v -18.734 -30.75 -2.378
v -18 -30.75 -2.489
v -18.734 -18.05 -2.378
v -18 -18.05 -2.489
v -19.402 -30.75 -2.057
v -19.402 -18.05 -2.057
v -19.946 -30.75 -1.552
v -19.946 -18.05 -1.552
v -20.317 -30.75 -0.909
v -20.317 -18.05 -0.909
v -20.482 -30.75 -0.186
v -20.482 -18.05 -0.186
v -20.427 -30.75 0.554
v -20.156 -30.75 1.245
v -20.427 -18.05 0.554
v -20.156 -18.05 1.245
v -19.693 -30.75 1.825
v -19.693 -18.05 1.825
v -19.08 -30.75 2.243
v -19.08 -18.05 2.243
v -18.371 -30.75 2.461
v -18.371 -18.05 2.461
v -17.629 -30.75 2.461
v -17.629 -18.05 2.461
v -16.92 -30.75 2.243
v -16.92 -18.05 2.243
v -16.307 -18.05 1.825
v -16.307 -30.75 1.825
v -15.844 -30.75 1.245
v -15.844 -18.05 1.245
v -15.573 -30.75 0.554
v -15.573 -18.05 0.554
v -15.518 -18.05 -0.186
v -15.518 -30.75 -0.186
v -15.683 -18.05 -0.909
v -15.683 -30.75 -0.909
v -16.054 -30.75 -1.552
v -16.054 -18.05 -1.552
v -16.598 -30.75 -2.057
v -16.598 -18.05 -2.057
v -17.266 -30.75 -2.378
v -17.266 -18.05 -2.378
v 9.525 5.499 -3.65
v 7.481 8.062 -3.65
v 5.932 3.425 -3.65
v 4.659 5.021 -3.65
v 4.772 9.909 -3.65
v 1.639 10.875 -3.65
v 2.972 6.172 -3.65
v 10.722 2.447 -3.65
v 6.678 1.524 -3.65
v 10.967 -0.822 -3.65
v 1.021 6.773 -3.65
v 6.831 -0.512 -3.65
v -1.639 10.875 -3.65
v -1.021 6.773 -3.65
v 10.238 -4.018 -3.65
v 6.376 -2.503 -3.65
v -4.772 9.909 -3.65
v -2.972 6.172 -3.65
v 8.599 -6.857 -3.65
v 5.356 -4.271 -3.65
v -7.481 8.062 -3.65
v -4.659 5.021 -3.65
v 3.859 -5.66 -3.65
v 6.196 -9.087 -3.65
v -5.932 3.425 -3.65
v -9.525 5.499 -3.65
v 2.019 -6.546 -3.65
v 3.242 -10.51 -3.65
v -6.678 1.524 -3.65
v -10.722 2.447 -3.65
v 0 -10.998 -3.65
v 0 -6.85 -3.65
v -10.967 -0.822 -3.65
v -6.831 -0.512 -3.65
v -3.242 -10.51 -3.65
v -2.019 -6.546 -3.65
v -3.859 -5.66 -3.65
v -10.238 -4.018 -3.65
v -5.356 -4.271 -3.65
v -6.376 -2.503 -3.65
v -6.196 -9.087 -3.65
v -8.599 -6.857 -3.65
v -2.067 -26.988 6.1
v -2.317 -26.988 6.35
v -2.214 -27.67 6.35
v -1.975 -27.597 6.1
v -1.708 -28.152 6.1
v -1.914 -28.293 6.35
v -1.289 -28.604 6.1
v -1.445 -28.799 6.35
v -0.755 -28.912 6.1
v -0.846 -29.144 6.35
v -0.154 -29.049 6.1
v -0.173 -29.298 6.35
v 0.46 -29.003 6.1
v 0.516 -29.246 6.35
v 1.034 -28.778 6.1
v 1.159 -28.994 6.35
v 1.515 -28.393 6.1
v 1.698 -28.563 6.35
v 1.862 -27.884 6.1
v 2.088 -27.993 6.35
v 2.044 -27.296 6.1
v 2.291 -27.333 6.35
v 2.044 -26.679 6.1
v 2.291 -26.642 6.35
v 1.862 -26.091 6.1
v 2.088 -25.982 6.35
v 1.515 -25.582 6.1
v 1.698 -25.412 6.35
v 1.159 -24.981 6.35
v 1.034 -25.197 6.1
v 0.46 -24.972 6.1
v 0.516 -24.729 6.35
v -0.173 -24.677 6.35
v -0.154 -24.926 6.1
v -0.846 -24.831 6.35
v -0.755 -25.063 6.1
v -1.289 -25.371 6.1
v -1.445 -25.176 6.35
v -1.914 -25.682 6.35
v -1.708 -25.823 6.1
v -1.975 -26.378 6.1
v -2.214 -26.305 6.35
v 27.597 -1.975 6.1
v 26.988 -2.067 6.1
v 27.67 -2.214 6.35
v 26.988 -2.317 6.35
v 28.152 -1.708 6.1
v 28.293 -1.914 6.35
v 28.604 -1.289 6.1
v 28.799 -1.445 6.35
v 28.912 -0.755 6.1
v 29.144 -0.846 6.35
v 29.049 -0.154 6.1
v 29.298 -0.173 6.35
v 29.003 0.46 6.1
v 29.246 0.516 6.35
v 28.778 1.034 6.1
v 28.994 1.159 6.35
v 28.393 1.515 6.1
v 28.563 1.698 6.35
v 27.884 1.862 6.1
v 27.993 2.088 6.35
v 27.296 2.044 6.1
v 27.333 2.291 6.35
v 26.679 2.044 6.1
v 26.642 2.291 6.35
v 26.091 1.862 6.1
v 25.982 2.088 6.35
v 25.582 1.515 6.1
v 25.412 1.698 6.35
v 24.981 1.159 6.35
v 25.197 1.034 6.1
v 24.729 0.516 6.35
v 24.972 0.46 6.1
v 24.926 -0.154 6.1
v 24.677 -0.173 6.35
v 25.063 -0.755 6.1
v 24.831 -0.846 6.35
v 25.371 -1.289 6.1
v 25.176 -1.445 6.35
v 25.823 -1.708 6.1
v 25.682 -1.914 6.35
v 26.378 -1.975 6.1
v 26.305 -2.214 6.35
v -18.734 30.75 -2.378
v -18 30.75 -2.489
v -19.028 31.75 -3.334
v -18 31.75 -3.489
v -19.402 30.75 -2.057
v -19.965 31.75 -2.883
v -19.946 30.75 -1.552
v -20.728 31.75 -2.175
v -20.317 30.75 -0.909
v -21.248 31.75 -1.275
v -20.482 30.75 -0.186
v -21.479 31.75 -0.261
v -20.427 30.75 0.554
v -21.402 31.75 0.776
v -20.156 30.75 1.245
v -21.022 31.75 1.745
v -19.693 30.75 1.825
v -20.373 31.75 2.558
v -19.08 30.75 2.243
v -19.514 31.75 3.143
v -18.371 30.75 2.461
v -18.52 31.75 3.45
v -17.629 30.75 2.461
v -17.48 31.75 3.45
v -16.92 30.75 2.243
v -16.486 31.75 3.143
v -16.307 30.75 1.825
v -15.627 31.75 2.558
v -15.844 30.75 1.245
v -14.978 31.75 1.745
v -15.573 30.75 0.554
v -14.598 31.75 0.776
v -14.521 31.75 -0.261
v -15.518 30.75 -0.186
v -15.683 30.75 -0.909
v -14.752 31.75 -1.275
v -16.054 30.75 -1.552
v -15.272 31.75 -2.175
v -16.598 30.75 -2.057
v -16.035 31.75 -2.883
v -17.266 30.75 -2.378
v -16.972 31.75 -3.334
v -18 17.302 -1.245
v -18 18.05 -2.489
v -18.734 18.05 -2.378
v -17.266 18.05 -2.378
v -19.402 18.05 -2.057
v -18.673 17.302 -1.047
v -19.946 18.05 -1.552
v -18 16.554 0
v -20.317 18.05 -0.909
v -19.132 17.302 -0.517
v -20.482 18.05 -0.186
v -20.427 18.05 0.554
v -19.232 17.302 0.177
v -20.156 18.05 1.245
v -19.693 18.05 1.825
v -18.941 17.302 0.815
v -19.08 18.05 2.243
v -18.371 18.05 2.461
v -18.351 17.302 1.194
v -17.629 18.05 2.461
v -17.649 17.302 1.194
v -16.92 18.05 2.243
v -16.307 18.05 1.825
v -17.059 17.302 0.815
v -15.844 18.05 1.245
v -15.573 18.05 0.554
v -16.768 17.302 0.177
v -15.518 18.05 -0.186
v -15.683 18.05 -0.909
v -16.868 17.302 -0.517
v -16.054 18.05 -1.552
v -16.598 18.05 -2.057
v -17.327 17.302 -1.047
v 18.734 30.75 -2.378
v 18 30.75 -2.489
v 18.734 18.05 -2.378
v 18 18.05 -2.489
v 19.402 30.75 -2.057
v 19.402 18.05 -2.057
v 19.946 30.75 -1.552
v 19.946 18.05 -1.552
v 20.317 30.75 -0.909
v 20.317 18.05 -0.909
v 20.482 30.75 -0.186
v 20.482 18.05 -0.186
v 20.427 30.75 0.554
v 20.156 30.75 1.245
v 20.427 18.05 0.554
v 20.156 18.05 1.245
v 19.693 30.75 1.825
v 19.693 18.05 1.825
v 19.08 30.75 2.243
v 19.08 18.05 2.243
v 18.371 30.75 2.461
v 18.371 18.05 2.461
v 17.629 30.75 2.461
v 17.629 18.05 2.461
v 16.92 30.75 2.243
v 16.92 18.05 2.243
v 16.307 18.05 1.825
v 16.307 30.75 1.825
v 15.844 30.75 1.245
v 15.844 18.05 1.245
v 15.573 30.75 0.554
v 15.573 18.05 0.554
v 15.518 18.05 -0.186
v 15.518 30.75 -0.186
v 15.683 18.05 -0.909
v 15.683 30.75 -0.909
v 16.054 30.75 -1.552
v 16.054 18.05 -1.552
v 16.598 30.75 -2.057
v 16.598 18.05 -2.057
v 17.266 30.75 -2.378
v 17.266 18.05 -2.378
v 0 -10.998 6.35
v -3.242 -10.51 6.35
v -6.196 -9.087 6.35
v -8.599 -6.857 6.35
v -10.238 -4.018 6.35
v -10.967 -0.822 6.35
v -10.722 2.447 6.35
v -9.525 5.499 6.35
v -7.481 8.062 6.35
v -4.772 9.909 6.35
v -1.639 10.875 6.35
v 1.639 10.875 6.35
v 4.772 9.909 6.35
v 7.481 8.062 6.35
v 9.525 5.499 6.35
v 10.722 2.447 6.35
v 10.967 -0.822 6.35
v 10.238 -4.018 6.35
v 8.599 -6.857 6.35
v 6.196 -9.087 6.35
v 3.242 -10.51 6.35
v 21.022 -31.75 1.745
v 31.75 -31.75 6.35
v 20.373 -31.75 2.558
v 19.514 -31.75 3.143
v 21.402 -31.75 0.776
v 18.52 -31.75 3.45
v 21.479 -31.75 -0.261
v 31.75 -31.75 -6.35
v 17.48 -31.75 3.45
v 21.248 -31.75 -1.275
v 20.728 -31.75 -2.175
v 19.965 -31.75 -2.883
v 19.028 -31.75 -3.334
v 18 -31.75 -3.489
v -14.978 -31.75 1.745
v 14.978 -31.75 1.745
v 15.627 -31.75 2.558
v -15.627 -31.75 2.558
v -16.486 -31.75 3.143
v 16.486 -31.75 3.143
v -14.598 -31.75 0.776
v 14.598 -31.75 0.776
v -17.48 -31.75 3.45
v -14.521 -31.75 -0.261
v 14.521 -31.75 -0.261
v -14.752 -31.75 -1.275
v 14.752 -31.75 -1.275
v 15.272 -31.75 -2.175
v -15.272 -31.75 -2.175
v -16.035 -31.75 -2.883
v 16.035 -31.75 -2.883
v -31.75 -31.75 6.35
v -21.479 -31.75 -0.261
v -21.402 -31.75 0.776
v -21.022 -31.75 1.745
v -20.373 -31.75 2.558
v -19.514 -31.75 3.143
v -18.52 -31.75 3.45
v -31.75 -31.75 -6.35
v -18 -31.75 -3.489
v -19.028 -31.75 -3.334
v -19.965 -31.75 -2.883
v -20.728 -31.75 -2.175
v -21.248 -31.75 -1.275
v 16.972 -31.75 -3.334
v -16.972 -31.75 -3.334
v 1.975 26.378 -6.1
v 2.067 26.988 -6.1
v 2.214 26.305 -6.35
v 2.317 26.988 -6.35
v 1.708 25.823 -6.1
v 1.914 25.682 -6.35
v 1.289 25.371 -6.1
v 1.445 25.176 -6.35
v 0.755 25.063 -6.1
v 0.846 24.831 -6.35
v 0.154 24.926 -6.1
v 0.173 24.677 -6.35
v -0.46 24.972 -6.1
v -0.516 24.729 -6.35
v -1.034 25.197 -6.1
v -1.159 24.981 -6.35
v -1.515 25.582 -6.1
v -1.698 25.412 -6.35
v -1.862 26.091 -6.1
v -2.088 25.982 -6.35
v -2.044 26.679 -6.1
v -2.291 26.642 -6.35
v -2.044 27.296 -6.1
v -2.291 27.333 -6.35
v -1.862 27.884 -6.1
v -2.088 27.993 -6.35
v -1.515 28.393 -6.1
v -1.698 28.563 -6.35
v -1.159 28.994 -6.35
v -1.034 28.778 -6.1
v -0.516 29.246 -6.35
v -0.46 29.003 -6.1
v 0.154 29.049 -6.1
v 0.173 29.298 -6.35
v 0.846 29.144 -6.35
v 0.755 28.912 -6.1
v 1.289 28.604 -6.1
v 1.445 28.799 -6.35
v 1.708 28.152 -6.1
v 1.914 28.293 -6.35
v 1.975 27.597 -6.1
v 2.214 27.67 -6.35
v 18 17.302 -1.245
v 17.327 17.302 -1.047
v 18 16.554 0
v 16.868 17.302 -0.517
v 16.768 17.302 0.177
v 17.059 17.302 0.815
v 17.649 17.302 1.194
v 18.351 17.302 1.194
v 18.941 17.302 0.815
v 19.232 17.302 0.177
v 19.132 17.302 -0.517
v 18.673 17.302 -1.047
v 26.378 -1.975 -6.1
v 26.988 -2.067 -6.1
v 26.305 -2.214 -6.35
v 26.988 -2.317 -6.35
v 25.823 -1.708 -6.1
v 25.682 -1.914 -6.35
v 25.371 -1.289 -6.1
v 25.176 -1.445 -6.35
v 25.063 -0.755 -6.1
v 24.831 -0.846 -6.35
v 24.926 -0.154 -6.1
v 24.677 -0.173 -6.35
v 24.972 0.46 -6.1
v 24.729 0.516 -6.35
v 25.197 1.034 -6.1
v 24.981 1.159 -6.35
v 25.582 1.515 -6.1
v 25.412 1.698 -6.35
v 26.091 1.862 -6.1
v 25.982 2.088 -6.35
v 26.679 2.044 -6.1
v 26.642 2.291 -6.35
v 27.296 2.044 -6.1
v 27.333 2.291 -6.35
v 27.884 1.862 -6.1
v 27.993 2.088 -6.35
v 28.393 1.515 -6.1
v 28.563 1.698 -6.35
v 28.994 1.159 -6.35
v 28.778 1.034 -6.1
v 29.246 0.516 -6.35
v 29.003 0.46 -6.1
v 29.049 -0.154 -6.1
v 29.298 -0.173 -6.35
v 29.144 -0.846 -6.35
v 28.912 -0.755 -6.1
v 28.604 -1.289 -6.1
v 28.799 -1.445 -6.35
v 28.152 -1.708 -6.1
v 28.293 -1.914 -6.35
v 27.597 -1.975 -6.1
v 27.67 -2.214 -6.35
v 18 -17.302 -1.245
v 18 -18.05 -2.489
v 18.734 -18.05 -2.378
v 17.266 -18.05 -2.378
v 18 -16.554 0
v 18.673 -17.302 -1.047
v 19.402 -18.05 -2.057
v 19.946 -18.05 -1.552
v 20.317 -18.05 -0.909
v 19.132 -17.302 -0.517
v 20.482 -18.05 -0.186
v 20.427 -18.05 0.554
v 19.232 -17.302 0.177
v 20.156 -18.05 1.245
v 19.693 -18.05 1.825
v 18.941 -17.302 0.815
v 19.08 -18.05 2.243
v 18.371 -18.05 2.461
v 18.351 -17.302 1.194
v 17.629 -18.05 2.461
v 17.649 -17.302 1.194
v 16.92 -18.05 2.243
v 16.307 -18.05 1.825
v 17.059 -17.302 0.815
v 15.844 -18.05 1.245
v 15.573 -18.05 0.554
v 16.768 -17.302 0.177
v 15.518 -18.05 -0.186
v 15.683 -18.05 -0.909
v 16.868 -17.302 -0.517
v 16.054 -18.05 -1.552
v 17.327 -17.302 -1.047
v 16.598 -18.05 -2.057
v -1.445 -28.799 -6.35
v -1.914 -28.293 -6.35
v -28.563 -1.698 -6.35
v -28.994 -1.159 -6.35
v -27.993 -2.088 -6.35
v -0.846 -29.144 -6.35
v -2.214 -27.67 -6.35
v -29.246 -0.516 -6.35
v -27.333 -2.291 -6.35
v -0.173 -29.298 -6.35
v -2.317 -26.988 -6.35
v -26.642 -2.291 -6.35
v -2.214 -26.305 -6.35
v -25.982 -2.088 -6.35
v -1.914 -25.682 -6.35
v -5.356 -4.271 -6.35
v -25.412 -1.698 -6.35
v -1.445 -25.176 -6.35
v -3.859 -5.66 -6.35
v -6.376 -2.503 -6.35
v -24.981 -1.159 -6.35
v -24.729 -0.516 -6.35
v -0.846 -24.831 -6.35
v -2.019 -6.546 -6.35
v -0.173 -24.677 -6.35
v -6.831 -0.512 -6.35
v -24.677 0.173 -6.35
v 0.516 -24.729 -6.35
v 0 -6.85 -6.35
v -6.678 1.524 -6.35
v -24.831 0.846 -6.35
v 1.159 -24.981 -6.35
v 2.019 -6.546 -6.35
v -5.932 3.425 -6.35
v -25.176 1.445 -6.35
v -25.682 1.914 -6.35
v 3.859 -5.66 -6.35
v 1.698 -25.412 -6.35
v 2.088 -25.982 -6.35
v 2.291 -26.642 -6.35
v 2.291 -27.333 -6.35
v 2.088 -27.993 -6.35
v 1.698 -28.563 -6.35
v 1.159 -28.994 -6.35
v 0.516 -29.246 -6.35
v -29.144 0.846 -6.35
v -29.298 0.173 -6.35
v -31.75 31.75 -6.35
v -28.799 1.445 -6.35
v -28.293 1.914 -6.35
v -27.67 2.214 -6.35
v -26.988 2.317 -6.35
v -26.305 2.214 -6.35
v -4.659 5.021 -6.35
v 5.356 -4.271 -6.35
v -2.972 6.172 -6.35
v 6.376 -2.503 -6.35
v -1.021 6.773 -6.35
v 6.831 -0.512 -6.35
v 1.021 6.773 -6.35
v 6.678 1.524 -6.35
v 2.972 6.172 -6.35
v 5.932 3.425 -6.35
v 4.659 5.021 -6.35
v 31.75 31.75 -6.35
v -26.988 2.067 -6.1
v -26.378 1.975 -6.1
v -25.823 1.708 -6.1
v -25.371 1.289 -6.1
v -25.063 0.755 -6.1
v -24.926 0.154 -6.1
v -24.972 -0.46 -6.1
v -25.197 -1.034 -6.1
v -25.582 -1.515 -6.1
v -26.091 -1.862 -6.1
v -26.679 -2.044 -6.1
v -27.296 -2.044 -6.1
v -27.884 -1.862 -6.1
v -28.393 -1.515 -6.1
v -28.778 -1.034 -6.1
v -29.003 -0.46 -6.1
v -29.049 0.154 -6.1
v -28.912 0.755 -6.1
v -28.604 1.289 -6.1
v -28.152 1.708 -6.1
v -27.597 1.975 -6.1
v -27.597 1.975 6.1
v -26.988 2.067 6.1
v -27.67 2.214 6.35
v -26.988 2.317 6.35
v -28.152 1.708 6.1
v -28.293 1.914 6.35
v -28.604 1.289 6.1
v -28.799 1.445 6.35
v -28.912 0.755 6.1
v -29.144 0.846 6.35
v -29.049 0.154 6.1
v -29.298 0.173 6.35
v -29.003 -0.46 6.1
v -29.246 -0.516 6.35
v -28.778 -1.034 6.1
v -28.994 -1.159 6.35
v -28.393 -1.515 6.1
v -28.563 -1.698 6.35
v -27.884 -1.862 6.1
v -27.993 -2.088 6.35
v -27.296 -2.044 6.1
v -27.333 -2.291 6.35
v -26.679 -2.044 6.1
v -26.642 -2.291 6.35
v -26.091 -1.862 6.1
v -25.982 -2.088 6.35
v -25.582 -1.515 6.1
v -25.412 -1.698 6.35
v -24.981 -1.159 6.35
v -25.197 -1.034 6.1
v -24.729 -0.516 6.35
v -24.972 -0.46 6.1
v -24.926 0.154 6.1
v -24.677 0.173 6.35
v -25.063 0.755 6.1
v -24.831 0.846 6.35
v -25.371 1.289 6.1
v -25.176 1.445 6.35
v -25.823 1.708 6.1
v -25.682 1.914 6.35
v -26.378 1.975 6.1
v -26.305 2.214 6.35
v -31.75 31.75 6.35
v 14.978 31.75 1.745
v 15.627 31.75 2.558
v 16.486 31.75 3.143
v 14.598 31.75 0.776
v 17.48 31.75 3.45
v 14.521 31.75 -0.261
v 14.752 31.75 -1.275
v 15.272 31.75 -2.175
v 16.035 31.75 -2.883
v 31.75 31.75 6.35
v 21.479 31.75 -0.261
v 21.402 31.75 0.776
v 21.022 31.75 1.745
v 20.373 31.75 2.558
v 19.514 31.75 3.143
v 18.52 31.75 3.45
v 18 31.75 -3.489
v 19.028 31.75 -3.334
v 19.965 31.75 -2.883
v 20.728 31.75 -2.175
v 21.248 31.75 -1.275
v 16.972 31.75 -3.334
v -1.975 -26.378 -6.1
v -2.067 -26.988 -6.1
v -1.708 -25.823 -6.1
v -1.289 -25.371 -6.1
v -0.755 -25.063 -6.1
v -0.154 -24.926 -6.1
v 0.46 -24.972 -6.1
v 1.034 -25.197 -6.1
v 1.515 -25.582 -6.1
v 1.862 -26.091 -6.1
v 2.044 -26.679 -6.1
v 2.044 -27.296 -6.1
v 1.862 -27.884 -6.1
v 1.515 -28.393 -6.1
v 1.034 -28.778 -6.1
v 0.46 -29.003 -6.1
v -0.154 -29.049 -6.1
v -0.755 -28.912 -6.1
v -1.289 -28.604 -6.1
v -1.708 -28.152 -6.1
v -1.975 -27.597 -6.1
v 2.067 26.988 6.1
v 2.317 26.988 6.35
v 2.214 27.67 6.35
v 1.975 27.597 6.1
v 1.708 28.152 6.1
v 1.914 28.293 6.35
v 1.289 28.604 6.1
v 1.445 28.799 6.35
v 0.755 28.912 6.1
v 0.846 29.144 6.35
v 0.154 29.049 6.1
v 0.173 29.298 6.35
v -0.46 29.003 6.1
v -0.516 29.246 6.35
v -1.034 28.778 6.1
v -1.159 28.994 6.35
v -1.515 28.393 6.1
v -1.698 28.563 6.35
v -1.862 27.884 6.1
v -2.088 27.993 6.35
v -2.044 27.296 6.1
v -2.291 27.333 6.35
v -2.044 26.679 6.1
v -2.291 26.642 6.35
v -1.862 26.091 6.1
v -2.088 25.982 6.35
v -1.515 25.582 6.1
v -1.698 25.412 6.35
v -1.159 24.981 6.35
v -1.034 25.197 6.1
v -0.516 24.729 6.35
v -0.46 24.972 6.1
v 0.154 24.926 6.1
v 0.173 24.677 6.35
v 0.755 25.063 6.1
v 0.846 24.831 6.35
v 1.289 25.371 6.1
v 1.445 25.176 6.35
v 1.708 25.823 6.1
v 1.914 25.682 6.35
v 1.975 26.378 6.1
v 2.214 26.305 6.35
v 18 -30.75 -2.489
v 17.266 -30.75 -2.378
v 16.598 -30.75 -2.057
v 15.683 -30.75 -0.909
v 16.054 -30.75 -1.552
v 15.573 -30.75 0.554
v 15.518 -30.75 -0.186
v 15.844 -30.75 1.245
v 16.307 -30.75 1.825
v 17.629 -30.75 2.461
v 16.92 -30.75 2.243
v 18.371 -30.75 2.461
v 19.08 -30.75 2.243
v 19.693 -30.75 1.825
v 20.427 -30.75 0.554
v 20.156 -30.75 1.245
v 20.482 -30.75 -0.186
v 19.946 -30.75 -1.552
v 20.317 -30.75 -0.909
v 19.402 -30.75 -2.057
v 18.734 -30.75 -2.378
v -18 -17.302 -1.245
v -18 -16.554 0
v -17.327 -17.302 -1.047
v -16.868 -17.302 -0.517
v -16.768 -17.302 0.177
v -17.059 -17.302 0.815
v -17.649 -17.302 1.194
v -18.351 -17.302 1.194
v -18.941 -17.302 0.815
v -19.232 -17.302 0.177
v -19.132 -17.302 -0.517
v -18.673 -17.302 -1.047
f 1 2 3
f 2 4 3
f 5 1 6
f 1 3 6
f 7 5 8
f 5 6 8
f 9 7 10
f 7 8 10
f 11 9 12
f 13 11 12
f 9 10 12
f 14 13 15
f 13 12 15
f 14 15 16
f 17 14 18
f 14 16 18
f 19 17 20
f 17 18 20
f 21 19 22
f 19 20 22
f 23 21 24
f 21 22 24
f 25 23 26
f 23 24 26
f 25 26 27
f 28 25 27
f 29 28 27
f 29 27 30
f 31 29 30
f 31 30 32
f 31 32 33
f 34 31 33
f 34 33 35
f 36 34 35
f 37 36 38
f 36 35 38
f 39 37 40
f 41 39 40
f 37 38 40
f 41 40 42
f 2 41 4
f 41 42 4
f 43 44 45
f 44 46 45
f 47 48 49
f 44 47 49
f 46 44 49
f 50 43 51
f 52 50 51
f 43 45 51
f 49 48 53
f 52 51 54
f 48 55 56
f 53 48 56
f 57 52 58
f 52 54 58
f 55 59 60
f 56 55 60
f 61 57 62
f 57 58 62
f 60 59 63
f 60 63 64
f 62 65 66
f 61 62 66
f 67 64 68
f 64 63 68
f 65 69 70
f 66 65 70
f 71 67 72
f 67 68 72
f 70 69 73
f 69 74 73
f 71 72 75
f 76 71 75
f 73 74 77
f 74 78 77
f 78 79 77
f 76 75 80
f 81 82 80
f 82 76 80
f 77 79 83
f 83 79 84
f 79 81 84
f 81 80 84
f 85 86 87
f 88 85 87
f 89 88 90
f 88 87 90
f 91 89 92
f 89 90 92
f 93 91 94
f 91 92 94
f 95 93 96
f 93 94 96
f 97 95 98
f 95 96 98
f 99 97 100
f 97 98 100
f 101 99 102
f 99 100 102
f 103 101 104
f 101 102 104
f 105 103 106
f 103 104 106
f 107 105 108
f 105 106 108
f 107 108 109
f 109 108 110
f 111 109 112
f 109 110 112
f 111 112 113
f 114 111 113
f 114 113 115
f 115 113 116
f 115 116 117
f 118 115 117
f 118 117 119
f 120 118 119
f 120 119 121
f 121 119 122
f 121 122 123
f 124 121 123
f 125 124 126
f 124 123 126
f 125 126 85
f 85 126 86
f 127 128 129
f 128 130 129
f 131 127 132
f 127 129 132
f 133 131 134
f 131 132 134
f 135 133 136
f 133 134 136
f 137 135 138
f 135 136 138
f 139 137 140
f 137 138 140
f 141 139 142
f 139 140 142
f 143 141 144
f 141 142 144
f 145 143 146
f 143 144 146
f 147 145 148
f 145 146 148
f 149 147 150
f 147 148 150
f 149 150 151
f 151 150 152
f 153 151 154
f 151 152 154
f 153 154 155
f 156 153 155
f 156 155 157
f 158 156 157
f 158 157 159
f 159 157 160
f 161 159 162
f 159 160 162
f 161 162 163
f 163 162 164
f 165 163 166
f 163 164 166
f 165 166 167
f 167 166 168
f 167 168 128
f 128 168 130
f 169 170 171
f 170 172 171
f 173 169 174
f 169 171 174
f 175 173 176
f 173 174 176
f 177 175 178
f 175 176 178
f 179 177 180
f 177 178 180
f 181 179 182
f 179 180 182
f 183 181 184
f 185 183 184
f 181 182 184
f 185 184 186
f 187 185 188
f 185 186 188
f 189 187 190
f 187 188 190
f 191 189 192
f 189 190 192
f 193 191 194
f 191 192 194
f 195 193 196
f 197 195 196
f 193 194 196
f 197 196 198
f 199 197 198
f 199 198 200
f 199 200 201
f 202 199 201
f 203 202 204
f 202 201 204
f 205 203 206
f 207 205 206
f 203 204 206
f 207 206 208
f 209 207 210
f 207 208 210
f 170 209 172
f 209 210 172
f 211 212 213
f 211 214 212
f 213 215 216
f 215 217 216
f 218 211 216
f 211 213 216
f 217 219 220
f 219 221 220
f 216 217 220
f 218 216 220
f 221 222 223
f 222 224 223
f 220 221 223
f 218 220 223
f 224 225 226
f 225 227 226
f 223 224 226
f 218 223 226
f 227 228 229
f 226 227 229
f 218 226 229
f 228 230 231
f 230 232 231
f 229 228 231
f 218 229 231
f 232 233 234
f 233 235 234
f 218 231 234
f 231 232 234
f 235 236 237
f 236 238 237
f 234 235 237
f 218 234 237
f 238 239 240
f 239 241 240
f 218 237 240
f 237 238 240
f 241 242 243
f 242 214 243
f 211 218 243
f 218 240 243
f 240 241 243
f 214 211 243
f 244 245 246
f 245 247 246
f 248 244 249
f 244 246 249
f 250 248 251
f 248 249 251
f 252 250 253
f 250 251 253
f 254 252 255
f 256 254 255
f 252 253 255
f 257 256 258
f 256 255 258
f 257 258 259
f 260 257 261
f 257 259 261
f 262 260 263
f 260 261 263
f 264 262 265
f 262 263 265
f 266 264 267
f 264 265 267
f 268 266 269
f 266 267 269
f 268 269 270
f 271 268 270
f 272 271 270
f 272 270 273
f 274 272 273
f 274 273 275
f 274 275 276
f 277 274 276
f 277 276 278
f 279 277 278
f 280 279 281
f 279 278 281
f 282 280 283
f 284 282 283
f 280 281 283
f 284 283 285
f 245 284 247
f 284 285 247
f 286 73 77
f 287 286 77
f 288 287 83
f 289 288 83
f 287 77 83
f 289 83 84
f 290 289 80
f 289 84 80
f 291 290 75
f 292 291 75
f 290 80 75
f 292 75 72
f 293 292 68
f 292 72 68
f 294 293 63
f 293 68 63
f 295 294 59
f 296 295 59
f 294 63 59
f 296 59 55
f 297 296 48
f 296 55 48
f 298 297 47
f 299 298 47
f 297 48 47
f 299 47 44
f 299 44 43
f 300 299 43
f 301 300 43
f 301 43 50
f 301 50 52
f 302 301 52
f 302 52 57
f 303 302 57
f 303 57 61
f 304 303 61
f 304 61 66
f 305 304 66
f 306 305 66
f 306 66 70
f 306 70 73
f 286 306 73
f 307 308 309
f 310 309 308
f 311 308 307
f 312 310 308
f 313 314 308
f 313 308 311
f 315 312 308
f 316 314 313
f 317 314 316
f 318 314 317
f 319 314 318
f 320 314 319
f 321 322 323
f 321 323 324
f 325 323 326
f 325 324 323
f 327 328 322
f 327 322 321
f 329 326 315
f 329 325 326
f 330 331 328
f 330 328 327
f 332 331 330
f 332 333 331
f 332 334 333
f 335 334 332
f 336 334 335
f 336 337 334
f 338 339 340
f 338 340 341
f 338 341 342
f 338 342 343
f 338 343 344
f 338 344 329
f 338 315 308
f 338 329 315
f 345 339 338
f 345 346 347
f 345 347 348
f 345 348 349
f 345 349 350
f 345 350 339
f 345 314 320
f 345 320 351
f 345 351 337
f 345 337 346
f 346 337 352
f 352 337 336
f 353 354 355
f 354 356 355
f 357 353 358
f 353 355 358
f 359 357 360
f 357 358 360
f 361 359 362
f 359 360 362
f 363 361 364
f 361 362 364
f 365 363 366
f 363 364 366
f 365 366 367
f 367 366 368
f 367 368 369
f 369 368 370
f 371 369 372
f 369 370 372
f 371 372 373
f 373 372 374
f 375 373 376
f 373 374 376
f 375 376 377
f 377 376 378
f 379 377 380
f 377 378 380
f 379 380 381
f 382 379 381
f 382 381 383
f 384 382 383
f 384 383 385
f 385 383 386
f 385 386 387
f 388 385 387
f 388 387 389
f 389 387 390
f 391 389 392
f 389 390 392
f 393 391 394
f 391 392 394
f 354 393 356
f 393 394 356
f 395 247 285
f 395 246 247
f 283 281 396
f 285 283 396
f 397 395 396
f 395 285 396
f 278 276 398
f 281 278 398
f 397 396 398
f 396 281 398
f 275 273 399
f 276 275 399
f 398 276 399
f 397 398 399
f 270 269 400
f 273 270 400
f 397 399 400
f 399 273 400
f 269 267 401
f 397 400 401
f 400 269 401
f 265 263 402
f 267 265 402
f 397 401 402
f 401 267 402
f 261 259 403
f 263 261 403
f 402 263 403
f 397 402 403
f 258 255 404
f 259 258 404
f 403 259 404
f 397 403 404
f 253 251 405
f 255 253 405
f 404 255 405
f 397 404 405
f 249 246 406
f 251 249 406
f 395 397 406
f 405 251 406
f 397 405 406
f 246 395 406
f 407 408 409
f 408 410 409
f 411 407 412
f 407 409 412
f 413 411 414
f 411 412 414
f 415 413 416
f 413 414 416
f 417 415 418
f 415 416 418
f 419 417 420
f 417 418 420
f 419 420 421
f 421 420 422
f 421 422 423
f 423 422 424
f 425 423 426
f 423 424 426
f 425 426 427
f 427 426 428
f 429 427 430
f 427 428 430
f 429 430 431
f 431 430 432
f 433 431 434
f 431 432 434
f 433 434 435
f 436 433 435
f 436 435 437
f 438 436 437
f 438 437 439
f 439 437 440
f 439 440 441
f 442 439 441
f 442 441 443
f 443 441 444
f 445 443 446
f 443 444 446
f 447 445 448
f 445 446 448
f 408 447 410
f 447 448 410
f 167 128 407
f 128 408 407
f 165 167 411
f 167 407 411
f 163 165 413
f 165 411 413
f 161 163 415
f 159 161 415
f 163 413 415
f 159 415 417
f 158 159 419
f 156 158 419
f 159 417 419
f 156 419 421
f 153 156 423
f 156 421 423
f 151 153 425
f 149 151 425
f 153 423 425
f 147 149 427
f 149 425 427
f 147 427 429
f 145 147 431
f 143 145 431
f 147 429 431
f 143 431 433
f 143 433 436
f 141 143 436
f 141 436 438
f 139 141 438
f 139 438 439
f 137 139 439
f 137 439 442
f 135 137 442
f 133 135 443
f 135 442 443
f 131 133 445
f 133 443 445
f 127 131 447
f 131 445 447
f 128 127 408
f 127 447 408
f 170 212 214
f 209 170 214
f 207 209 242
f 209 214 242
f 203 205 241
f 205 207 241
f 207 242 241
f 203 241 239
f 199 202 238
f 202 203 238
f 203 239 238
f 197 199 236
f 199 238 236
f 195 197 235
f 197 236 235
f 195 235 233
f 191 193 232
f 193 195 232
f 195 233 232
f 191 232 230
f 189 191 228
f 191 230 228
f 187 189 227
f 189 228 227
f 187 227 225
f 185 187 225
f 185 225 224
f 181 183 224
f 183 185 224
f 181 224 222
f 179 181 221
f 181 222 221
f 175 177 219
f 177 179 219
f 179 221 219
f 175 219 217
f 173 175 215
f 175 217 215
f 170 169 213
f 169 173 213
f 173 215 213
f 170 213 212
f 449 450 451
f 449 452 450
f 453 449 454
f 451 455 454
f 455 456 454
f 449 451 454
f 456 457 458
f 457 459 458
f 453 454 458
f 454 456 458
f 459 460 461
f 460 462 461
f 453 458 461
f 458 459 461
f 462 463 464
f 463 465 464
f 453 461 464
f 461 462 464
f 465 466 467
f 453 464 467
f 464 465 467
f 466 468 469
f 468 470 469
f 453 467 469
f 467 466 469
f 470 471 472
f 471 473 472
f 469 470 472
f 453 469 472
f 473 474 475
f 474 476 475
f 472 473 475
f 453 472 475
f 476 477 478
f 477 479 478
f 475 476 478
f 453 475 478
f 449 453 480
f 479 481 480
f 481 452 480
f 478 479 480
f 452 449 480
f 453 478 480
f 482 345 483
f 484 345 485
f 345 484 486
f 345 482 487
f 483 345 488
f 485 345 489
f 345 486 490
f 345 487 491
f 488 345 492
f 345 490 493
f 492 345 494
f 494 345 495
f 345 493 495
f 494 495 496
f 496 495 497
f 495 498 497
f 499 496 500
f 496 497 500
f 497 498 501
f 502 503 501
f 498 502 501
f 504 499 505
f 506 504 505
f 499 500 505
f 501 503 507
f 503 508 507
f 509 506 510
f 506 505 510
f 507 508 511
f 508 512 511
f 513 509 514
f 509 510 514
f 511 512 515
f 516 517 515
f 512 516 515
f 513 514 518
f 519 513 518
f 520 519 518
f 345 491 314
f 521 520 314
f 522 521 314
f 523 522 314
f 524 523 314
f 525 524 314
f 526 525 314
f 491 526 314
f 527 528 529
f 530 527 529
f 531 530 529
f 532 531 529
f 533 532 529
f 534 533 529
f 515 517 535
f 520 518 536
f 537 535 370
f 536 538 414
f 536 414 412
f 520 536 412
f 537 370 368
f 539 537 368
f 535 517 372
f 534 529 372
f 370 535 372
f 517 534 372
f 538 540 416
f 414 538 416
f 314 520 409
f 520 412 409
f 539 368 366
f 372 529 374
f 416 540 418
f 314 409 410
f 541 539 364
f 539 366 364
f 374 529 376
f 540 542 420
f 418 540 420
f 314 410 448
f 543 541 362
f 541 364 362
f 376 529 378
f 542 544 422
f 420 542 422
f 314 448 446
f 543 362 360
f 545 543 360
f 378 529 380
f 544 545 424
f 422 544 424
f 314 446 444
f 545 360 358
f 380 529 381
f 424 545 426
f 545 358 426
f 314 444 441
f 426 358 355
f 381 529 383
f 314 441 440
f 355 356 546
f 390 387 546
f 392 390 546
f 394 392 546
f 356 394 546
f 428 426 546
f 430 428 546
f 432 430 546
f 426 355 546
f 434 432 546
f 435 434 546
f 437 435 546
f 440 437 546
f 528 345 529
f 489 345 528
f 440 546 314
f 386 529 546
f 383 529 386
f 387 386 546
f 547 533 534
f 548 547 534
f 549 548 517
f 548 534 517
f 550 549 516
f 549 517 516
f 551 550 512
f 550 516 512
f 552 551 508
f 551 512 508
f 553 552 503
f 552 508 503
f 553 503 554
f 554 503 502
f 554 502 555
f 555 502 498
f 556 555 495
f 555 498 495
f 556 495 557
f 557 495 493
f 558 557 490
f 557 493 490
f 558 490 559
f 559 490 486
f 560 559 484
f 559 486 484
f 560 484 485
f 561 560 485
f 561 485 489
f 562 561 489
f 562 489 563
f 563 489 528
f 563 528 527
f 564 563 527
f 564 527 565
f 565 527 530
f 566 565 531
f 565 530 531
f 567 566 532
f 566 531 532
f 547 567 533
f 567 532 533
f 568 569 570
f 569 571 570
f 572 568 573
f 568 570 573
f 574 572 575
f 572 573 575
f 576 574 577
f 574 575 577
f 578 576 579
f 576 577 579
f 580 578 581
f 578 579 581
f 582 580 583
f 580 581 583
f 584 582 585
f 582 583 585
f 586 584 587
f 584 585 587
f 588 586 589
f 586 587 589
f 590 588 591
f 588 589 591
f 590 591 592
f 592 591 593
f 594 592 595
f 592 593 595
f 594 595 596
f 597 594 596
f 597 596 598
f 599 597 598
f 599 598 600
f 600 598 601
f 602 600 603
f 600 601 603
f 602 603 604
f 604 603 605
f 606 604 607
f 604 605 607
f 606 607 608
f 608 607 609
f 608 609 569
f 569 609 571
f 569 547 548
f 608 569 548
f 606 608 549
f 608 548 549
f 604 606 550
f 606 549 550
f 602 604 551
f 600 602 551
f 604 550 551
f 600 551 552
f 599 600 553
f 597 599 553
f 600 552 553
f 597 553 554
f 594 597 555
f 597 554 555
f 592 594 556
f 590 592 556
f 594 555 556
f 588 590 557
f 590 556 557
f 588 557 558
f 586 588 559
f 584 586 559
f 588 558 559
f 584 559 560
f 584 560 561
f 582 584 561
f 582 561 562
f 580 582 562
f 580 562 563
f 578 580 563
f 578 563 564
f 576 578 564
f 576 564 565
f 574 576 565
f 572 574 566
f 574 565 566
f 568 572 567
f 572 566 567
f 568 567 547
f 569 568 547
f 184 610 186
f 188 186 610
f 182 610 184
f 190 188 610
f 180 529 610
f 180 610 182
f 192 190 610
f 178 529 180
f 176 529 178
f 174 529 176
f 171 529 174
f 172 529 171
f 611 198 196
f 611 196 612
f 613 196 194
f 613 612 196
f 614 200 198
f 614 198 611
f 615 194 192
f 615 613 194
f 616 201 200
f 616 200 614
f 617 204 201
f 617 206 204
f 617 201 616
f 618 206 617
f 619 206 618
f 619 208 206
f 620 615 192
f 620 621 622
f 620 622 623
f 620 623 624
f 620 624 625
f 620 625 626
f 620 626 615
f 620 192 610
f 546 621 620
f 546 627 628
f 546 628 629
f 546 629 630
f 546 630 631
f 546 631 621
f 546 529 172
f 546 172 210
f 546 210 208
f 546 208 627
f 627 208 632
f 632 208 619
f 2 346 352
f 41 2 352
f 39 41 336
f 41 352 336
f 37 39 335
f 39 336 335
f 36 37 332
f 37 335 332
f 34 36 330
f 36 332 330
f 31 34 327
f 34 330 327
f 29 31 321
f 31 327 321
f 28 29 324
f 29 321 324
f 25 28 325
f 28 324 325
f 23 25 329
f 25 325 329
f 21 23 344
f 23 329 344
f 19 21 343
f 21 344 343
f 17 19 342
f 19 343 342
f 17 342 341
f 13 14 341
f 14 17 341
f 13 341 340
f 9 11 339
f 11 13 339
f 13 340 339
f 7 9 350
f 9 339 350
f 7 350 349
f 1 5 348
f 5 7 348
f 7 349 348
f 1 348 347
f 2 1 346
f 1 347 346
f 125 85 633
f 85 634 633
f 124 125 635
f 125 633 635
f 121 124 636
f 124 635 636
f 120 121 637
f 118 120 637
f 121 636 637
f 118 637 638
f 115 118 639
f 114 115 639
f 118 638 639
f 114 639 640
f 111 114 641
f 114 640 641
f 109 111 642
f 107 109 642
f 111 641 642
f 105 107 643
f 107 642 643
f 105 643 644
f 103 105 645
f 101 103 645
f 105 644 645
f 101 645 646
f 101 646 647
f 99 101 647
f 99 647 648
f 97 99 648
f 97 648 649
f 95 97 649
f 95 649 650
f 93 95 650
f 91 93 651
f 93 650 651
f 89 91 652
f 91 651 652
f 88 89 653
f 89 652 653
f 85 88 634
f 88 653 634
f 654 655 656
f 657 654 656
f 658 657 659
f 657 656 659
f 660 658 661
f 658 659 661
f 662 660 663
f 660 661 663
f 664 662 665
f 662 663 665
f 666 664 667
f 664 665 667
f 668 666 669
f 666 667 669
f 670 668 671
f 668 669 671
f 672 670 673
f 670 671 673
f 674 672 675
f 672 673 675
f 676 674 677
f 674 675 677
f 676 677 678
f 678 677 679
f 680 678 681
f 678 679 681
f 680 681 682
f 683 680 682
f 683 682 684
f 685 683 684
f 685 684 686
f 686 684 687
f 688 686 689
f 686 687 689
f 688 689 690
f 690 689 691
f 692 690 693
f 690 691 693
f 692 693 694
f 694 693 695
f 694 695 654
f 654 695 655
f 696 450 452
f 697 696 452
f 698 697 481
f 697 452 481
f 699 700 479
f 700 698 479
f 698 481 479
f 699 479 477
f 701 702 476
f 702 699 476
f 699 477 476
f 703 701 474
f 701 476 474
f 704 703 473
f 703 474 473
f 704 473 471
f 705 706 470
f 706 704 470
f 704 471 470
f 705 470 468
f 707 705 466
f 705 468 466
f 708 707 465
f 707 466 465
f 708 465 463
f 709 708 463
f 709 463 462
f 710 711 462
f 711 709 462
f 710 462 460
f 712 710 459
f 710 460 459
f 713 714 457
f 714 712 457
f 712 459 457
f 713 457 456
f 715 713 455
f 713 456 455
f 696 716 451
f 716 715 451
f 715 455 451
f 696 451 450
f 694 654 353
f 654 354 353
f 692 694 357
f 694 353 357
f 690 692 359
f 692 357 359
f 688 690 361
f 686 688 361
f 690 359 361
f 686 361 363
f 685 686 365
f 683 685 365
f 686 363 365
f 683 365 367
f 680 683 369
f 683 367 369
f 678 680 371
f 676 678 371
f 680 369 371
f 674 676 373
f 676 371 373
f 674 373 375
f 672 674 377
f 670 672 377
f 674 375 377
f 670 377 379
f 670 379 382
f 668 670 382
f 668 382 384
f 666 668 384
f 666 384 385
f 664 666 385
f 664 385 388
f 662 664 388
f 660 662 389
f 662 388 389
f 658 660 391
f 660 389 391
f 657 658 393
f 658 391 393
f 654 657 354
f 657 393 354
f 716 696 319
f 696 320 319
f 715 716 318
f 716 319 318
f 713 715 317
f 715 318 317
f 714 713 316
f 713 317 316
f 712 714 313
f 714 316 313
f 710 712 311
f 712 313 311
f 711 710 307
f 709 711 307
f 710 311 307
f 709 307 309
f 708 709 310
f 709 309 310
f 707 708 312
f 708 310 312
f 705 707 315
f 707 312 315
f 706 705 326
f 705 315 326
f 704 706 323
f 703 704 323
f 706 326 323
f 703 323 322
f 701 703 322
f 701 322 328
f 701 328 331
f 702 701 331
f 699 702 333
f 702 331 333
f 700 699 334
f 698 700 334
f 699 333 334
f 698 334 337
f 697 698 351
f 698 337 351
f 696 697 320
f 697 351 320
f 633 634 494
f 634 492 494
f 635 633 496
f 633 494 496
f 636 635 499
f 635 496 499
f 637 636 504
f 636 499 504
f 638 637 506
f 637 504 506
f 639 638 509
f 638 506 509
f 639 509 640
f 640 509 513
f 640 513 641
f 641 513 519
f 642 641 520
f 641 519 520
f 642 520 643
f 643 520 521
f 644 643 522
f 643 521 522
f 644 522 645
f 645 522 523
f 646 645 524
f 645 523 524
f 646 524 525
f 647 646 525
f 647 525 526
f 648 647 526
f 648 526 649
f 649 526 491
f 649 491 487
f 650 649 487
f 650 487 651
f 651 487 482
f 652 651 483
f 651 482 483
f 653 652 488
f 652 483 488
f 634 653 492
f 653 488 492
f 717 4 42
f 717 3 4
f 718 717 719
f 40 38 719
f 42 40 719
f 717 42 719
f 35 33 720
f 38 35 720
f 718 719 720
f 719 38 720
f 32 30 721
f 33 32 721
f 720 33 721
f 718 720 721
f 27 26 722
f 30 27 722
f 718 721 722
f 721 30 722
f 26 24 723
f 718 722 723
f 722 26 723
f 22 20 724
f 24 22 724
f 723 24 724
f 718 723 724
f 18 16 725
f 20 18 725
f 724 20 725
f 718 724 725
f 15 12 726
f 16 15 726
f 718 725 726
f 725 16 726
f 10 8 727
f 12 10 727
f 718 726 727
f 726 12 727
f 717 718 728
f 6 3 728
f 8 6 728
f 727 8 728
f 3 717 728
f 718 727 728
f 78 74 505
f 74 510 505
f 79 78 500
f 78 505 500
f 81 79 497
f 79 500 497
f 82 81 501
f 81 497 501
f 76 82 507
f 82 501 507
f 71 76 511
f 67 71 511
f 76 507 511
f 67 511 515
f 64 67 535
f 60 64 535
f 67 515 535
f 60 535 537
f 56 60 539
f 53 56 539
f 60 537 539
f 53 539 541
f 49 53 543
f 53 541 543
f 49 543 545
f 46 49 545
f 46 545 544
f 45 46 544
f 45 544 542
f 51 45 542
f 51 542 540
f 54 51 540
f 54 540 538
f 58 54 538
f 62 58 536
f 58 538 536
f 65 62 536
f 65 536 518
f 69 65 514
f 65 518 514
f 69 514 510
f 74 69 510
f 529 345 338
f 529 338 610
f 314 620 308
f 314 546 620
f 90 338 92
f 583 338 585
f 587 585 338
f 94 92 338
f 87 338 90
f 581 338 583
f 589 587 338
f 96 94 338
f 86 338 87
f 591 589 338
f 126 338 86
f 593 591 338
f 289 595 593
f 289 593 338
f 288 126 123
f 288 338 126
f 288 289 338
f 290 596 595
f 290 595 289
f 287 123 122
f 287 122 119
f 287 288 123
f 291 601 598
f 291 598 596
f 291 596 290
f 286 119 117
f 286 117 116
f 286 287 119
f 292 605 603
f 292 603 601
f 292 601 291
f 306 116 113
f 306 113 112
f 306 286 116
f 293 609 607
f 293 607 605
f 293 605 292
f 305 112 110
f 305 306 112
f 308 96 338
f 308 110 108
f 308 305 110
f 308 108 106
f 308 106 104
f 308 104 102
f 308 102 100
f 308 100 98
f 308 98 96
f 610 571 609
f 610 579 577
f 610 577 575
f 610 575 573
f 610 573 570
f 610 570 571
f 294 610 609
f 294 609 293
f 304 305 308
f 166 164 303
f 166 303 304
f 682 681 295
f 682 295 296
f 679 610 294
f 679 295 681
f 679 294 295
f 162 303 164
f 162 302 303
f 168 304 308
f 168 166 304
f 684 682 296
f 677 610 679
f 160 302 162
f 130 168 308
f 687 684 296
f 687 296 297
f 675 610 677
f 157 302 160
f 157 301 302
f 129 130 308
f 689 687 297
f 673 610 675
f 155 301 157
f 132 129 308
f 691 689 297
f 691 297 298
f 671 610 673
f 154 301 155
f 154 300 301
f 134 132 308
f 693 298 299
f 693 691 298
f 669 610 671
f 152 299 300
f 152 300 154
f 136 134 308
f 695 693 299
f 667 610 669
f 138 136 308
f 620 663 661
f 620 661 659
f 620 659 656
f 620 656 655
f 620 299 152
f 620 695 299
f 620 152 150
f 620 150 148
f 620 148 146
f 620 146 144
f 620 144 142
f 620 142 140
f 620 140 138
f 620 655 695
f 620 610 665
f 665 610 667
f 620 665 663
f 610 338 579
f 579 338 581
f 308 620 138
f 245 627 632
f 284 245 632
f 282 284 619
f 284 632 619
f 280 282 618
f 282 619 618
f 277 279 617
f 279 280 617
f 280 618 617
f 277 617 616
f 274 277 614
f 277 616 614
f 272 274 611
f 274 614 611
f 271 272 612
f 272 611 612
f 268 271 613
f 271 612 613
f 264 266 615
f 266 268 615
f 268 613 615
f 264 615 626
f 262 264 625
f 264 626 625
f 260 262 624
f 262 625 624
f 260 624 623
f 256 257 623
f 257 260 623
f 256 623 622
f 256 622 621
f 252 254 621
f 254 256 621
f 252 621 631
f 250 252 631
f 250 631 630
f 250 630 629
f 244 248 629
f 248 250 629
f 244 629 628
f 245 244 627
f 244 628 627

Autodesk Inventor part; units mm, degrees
ref_plane "YZ Plane" through (0, 0, 0) normal (1, 0, 0) x (0, 1, 0)
ref_plane "XZ Plane" through (0, 0, 0) normal (0, 1, 0) x (-1, 0, 0)
ref_plane "XY Plane" through (0, 0, 0) normal (0, 0, 1) x (1, 0, 0)
sketch "Sketch1" plane through (0, 0, 0) normal (0, 0, 1) x (1, 0, 0)
  line L0 (-31.75, 31.75) -> (31.75, 31.75)
  line L1 (31.75, 31.75) -> (31.75, -31.75)
  line L2 (31.75, -31.75) -> (-31.75, -31.75)
  line L3 (-31.75, -31.75) -> (-31.75, 31.75)
  line L4 (0, 0) -> (0, 31.75) construction
  line L5 (0, 0) -> (0, -31.75) construction
  line L6 (0, 0) -> (31.75, 0) construction
  line L7 (0, 0) -> (-31.75, 0) construction
  dimension "d0" = 63.5
  dimension "d1" = 63.5
extrude "Extrusion1" add sketch "Sketch1" along normal mid plane 12.7
sketch "Sketch9" plane through (-31.75, -31.75, 6.35) normal (0, -1, 0) x (1, 0, 0)
  line L0 (63.5, 0) -> (0, 0) projected
  line L1 (0, 0) -> (0, -12.7) projected
  line L2 (0, -12.7) -> (63.5, -12.7) projected
  line L3 (63.5, 0) -> (63.5, -12.7) projected
  line L4 (0, -6.35) -> (63.5, -6.35) construction
  line L5 (31.75, 0) -> (31.75, -12.7) construction
  point P0 (13.75, -6.35)
  dimension "d37" = 18
hole "Hole3" at (-18, -31.75, 0) direction (0, 1, 0) diameter 4.978 depth 13.7 tip angle 118 thread size "1/4-20 UNC" class "1B" standard "ANSI Unified Screw Threads"
sketch "Sketch12" plane through (0, 0, 6.35) normal (0, 0, 1) x (1, 0, 0)
  point P0 (0, 0)
  point P1 (0, 0)
hole "Hole6" at (0, 0, 6.35) direction (0, 0, -1) diameter 13.7 end through all counterbore diameter 21.9964 counterbore depth 10
mirror "Mirror1" about plane through (0, 0, 0) normal (1, 0, 0) of "Hole3"
mirror "Mirror2" about plane through (0, 0, 0) normal (0, 1, 0) of "Hole3", "Mirror1"
chamfer "Chamfer2" distance 1 angle 45 4 edges at (-18, -31.75, 2.489) (18, -31.75, 2.489) (-18, 31.75, 2.489) (18, 31.75, 2.489)
sketch "Sketch11" plane through (0, 0, 6.35) normal (0, 0, 1) x (1, 0, 0)
  circle A0 centre (0, 0) radius 10.9982 projected
  line L0 (31.75, 31.75) -> (31.75, -31.75) projected
  line L1 (0, 0) -> (31.75, 0) construction
  point P0 (26.9875, 0)
  dimension "d82" = 26.9875
hole "Hole5" at (26.9875, 0, 6.35) direction (0, 0, -1) diameter 4.134 end through all thread size "M5x0.8" class "6H" standard "ANSI Metric M Profile"
pattern_circular "Circular Pattern4" count 4 over 360 about axis through (0, 0, -84.3461) along (0, 0, 1) of "Hole5"
chamfer "Chamfer3" distance 0.25 angle 45 8 edges at (26.9875, 2.067, 6.35) (-2.067, 26.9875, 6.35) (-26.9875, -2.067, 6.35) (2.067, -26.9875, 6.35) (-2.067, 26.9875, -6.35) (2.067, -26.9875, -6.35) (-26.9875, -2.067, -6.35) (26.9875, 2.067, -6.35)
properties part number "BB2-FrontPlate" material "Aluminum-6061-AHC"
